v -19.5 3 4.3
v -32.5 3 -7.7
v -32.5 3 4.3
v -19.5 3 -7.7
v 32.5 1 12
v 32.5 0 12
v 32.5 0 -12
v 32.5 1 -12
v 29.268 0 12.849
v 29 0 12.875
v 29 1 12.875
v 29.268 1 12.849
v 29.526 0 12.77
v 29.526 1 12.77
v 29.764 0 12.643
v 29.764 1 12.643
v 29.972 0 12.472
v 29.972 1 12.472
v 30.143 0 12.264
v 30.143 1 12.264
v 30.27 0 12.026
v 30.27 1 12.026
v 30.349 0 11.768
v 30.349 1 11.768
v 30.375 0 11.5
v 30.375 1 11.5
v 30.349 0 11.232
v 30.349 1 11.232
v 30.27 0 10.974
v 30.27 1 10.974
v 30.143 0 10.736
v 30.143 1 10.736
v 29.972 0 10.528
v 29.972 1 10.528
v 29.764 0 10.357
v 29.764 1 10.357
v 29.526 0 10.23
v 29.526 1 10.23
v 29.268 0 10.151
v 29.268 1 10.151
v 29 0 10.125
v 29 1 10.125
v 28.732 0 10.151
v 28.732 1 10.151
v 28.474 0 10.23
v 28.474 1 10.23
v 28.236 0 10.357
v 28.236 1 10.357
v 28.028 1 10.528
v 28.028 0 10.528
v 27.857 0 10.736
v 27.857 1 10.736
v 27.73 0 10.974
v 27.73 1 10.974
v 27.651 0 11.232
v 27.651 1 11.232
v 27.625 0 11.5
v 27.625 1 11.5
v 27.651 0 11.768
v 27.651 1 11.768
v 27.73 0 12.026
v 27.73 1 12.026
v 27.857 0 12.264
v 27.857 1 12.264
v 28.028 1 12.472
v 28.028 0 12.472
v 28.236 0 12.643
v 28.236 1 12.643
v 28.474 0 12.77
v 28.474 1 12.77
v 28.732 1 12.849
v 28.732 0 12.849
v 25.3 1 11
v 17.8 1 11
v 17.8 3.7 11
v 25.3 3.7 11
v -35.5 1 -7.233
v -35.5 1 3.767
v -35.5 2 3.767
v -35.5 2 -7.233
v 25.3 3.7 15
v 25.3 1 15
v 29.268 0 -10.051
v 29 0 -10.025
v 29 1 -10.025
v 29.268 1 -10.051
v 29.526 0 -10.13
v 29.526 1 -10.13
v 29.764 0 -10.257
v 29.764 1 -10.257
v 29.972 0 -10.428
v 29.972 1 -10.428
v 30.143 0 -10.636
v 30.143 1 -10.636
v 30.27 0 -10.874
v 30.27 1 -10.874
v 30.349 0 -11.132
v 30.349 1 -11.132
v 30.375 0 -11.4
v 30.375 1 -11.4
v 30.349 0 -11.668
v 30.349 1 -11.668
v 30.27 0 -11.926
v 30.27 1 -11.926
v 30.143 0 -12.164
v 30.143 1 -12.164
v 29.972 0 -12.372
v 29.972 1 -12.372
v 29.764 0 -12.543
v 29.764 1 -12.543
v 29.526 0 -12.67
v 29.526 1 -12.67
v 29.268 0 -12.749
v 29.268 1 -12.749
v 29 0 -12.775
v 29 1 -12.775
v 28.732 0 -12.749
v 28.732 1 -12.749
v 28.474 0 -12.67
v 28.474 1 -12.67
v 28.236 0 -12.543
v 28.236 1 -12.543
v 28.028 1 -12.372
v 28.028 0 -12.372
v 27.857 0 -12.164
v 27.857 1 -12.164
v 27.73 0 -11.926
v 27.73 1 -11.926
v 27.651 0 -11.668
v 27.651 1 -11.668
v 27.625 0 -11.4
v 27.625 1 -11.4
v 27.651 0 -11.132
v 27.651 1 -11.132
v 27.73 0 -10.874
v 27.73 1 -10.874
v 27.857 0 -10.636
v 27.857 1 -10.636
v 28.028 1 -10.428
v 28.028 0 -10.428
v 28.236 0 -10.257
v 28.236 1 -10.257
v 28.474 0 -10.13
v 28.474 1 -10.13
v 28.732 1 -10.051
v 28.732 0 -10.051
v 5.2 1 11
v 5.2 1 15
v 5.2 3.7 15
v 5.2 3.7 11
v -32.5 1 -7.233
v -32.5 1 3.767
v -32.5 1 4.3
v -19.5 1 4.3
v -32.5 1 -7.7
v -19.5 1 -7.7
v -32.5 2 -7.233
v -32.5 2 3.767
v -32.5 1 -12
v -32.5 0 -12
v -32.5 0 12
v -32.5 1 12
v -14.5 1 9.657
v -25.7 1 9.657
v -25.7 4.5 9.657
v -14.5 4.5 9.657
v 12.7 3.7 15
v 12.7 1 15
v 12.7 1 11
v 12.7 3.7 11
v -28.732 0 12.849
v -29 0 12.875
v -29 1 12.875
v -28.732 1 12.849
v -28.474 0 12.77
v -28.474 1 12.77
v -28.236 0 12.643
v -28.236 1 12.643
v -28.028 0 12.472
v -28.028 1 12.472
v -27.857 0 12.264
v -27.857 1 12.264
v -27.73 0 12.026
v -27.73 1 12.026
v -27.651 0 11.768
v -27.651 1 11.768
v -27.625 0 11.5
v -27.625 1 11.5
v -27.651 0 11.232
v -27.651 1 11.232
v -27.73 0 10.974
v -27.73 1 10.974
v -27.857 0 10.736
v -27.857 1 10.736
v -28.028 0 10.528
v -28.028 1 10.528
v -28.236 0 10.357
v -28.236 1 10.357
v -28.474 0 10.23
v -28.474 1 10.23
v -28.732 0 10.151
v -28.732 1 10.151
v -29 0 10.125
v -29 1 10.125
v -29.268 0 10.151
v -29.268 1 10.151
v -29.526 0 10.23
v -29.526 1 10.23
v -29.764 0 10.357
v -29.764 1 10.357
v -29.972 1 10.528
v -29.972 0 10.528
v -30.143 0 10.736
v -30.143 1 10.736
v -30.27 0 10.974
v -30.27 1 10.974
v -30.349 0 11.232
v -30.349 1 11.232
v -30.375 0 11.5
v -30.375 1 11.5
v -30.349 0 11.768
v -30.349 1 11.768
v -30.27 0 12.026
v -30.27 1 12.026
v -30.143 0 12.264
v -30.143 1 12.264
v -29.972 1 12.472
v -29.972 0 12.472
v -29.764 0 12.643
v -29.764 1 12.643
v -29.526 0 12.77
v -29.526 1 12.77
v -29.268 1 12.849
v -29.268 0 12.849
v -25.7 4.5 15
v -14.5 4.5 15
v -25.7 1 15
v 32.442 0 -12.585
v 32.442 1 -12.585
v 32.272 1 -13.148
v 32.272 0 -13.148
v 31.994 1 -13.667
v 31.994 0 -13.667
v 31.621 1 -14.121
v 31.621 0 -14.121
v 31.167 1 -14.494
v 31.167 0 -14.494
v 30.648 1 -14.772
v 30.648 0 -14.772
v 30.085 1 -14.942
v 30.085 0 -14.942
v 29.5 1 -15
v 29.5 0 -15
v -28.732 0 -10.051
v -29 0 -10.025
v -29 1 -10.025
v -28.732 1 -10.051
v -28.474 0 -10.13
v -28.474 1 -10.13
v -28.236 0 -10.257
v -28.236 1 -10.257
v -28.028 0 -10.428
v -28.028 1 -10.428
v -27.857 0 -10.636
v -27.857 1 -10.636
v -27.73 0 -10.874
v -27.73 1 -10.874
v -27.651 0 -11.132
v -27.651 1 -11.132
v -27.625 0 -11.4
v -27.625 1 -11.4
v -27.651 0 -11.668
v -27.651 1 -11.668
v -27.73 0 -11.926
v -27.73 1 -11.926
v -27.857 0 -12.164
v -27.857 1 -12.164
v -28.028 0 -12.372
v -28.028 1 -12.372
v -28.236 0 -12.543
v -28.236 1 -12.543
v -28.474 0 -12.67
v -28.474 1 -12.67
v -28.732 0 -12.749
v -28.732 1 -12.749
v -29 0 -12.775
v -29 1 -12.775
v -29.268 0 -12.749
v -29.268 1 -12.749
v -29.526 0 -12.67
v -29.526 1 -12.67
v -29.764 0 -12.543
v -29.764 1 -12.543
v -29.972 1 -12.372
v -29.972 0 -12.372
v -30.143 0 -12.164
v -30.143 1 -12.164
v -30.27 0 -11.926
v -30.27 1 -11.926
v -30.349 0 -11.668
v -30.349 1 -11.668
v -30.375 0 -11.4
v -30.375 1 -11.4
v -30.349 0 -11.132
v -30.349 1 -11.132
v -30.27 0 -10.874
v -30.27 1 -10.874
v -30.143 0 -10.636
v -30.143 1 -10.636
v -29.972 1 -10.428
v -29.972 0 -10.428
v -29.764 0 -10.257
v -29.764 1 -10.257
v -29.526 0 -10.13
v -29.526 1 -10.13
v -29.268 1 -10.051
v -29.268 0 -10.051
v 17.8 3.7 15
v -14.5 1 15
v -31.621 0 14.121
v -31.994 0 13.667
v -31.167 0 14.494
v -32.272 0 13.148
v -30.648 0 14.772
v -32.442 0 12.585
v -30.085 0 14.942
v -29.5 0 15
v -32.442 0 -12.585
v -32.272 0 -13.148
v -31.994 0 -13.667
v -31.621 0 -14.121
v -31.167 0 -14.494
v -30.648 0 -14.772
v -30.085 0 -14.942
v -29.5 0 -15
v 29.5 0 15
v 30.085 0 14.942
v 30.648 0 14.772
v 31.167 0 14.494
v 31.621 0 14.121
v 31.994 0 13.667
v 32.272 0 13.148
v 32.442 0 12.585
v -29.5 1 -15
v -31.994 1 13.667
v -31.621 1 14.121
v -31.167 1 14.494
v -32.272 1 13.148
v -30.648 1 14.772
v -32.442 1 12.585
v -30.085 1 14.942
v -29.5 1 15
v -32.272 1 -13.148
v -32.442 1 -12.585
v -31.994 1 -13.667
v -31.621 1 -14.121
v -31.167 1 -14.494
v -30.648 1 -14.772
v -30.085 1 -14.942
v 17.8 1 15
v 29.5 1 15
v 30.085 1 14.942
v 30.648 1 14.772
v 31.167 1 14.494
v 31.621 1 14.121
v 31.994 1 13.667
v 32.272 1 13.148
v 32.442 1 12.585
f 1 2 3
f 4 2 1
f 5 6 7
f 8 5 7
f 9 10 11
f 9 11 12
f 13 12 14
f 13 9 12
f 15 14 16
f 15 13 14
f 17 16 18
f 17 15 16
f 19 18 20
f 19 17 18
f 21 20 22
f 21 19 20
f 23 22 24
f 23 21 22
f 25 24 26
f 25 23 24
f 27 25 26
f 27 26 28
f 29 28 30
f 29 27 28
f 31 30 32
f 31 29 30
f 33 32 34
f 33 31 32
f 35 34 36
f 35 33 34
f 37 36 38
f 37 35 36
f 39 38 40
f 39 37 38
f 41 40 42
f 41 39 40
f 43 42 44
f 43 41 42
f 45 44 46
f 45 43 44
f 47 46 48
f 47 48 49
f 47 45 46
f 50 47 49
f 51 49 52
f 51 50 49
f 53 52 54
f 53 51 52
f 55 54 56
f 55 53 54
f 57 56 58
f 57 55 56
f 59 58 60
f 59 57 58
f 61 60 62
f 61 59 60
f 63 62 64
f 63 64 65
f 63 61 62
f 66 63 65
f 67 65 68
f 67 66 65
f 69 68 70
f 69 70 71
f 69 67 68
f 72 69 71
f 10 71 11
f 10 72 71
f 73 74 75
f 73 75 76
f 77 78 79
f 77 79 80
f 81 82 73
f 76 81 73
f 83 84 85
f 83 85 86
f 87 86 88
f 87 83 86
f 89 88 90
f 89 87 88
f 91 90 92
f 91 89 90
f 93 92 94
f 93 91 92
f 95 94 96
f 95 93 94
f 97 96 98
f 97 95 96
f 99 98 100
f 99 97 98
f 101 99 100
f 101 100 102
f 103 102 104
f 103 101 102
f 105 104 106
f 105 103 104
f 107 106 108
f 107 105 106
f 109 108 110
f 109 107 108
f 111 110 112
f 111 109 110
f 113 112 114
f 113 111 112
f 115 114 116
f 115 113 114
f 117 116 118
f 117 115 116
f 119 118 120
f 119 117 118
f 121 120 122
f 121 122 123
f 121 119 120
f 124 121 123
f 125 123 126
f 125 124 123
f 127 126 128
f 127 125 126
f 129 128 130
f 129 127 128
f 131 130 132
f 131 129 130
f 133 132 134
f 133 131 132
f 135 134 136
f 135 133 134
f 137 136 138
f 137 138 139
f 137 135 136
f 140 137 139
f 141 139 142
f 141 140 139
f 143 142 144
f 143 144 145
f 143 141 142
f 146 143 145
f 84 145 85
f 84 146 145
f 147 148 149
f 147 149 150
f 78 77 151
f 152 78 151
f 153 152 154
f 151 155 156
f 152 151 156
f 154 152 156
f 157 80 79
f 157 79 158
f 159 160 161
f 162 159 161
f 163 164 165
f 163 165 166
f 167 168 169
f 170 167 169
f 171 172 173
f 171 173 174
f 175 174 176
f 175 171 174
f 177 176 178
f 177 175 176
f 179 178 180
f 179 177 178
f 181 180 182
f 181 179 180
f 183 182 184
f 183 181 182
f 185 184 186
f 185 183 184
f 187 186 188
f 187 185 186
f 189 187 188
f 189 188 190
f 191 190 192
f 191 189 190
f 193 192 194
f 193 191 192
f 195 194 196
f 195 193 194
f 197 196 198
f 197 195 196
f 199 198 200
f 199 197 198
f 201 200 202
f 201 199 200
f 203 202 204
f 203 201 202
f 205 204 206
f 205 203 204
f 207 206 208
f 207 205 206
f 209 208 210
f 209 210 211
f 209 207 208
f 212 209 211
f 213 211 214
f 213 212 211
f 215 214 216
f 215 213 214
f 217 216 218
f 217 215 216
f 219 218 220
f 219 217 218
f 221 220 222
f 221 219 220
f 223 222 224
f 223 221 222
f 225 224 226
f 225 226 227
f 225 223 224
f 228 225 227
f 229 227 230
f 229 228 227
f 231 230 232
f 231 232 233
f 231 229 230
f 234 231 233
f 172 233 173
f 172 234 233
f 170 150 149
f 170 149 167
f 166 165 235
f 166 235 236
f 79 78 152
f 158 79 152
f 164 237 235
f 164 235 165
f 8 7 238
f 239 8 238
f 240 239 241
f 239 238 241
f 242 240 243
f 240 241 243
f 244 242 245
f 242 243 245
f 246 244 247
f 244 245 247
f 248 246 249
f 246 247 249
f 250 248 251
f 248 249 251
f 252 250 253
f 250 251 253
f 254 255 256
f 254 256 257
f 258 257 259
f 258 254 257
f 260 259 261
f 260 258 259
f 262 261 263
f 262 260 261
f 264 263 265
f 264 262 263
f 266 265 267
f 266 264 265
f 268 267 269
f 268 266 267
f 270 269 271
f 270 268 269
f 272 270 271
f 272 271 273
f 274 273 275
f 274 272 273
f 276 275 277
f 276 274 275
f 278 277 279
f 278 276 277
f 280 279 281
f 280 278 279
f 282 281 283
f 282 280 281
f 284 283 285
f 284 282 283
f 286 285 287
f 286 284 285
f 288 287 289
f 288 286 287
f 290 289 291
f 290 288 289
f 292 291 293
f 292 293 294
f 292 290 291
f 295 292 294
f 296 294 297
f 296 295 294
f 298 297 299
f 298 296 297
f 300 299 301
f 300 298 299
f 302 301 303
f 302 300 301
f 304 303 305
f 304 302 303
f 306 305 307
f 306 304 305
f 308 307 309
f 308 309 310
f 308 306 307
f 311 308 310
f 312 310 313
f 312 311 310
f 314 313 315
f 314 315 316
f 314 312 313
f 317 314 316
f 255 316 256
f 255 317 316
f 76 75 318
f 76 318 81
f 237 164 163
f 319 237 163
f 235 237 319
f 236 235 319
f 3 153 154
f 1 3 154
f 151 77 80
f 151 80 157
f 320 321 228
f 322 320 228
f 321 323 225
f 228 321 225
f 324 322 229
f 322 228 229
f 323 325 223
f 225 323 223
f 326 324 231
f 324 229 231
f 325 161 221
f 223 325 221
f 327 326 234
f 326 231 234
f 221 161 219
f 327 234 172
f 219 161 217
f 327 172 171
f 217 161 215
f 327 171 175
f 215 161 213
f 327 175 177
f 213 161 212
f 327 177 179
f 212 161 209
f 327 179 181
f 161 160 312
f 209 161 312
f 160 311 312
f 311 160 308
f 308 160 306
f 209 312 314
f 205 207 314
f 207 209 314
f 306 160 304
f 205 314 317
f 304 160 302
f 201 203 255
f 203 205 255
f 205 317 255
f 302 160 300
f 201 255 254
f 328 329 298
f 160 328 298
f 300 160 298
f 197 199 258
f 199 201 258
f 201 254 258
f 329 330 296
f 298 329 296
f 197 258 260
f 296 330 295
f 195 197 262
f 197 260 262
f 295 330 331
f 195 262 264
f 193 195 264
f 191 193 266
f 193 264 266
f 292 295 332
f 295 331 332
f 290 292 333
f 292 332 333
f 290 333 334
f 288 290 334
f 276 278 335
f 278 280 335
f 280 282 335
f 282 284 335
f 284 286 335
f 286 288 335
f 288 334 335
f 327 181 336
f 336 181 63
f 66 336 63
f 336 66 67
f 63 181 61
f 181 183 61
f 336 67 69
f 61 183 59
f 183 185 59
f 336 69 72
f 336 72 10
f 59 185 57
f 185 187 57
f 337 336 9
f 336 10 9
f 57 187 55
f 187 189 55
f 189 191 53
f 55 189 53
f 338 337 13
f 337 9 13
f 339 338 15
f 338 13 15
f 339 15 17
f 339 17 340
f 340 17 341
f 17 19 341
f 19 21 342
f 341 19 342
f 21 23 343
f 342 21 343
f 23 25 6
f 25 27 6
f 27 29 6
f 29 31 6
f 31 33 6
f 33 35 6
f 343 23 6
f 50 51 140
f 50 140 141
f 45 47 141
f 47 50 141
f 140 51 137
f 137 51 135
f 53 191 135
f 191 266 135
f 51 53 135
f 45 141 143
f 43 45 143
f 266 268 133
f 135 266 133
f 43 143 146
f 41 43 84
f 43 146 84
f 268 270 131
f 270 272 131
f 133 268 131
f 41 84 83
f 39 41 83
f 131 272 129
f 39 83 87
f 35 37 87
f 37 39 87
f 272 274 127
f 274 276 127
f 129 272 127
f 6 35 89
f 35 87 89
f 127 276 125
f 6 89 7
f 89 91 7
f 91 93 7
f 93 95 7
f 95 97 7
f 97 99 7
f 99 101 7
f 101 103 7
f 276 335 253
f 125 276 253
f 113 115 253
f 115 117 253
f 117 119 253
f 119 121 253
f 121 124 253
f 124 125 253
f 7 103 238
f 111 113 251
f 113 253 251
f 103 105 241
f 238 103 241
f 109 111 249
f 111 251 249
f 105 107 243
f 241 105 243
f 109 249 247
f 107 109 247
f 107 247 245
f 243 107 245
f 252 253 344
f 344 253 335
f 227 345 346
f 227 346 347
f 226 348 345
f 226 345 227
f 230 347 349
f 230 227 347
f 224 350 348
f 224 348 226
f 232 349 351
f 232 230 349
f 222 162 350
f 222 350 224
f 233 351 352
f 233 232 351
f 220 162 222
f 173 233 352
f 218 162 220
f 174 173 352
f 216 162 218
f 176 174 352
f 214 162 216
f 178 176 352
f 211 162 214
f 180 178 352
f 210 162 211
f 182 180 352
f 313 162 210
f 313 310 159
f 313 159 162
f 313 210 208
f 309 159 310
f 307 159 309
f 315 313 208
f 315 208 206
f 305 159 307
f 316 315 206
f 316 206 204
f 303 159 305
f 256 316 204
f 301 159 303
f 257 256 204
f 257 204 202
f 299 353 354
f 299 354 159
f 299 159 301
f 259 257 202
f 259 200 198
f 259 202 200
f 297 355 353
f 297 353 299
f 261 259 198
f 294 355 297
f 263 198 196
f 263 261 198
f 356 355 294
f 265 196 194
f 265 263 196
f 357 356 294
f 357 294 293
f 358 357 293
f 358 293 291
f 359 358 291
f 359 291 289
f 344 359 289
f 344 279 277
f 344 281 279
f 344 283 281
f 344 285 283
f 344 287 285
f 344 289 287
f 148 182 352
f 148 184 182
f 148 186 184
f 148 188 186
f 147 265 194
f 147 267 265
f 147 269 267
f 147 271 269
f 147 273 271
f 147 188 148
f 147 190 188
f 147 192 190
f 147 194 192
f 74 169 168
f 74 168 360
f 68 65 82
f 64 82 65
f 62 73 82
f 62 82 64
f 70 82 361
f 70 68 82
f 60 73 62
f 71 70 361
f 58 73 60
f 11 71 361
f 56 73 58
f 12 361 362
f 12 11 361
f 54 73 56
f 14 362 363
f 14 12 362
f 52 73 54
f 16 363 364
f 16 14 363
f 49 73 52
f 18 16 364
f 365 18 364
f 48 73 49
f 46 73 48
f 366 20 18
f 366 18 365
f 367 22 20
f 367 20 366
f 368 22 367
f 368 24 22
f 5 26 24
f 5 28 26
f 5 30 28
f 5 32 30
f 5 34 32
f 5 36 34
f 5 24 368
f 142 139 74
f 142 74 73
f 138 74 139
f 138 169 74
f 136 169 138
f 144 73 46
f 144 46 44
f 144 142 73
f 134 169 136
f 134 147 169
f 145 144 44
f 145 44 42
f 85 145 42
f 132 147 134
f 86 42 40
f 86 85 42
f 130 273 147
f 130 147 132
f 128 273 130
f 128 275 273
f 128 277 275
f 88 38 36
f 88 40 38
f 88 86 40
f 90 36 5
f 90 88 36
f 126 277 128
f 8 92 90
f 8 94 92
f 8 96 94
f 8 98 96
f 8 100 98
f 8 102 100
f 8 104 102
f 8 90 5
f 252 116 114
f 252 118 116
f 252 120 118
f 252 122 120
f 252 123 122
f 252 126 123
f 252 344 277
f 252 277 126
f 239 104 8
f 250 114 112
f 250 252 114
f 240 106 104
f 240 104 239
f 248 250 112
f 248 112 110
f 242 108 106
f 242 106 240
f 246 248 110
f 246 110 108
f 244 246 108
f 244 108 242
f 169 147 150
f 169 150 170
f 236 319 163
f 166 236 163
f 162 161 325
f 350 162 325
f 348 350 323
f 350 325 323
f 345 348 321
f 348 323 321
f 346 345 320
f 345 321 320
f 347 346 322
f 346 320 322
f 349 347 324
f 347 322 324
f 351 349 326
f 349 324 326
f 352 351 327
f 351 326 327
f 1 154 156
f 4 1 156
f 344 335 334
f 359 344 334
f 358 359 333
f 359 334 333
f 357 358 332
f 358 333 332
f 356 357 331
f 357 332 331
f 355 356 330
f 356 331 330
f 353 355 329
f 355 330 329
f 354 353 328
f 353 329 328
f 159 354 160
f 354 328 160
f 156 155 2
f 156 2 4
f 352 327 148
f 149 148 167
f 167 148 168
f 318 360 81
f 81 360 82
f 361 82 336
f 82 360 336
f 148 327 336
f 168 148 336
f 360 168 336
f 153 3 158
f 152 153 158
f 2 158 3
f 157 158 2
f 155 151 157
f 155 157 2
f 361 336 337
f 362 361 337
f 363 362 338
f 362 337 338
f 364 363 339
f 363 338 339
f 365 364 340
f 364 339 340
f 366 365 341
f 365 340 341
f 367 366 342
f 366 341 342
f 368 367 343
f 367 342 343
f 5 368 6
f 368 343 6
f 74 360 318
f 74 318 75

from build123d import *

# Parameters (mm, degrees)
SKETCH_1_R      = 1.375
EXTRUDE_1_DEPTH = 1
SKETCH_2_W      = 7.5
SKETCH_2_H      = 4
EXTRUDE_2_DEPTH = 2.7
SKETCH_3_W      = 11.2
SKETCH_3_H      = 5.343091965
EXTRUDE_3_DEPTH = 3.5
SKETCH_4_W      = 13
SKETCH_4_H      = 12
EXTRUDE_4_DEPTH = 2
SKETCH_5_W      = 16
SKETCH_5_H      = 11
EXTRUDE_5_DEPTH = 1


with BuildPart() as part:
    # 草图1 → 凸台-拉伸1 (new body)
    with BuildSketch(Plane(origin=(0, 0, 0), x_dir=(1, 0, 0), z_dir=(0, 1, 0))):
        with BuildLine():
            Line((-32.5, 12), (-32.5, -12))
            ThreePointArc((-32.5, -12), (-31.621320344, -14.121320344), (-29.5, -15))
            Line((-29.5, -15), (29.5, -15))
            ThreePointArc((29.5, -15), (31.621320344, -14.121320344), (32.5, -12))
            Line((32.5, -12), (32.5, 12))
            ThreePointArc((32.5, 12), (31.621320344, 14.121320344), (29.5, 15))
            Line((29.5, 15), (-29.5, 15))
            ThreePointArc((-29.5, 15), (-31.621320344, 14.121320344), (-32.5, 12))
        make_face()
        with Locations(Location((29, 11.4, 0), (0, 0, 270))):
            Circle(SKETCH_1_R, mode=Mode.SUBTRACT)
        with Locations(Location((29, -11.5, 0), (0, 0, 270))):
            Circle(SKETCH_1_R, mode=Mode.SUBTRACT)
        with Locations(Location((-29, -11.5, 0), (0, 0, 270))):
            Circle(SKETCH_1_R, mode=Mode.SUBTRACT)
        with Locations(Location((-29, 11.4, 0), (0, 0, 270))):
            Circle(SKETCH_1_R, mode=Mode.SUBTRACT)
    extrude(amount=EXTRUDE_1_DEPTH)

    # 草图2 → 凸台-拉伸2 (add)
    with BuildSketch(Plane(origin=(0, 1, 0), x_dir=(1, 0, 0), z_dir=(0, 1, 0))):
        with Locations((21.55, -13)):
            Rectangle(SKETCH_2_W, SKETCH_2_H)
        with Locations((8.95, -13)):
            Rectangle(SKETCH_2_W, SKETCH_2_H)
    extrude(amount=EXTRUDE_2_DEPTH)


with BuildPart() as body_2:
    # 草图3 → 凸台-拉伸3 (new body)
    with BuildSketch(Plane(origin=(0, 1, 0), x_dir=(1, 0, 0), z_dir=(0, 1, 0))):
        with Locations((-20.1, -12.328454018)):
            Rectangle(SKETCH_3_W, SKETCH_3_H)
    extrude(amount=EXTRUDE_3_DEPTH)


with BuildPart() as body_3:
    # 草图4 → 凸台-拉伸4 (new body)
    with BuildSketch(Plane(origin=(0, 1, 0), x_dir=(1, 0, 0), z_dir=(0, 1, 0))):
        with Locations((-26, 1.7)):
            Rectangle(SKETCH_4_W, SKETCH_4_H)
    extrude(amount=EXTRUDE_4_DEPTH)

    # 草图5 → 凸台-拉伸5 (add)
    with BuildSketch(Plane(origin=(0, 1, 0), x_dir=(1, 0, 0), z_dir=(0, 1, 0))):
        with Locations((-27.5, 1.732869615)):
            Rectangle(SKETCH_5_W, SKETCH_5_H)
    extrude(amount=EXTRUDE_5_DEPTH)


solid = Compound([part.part, body_2.part, body_3.part])
